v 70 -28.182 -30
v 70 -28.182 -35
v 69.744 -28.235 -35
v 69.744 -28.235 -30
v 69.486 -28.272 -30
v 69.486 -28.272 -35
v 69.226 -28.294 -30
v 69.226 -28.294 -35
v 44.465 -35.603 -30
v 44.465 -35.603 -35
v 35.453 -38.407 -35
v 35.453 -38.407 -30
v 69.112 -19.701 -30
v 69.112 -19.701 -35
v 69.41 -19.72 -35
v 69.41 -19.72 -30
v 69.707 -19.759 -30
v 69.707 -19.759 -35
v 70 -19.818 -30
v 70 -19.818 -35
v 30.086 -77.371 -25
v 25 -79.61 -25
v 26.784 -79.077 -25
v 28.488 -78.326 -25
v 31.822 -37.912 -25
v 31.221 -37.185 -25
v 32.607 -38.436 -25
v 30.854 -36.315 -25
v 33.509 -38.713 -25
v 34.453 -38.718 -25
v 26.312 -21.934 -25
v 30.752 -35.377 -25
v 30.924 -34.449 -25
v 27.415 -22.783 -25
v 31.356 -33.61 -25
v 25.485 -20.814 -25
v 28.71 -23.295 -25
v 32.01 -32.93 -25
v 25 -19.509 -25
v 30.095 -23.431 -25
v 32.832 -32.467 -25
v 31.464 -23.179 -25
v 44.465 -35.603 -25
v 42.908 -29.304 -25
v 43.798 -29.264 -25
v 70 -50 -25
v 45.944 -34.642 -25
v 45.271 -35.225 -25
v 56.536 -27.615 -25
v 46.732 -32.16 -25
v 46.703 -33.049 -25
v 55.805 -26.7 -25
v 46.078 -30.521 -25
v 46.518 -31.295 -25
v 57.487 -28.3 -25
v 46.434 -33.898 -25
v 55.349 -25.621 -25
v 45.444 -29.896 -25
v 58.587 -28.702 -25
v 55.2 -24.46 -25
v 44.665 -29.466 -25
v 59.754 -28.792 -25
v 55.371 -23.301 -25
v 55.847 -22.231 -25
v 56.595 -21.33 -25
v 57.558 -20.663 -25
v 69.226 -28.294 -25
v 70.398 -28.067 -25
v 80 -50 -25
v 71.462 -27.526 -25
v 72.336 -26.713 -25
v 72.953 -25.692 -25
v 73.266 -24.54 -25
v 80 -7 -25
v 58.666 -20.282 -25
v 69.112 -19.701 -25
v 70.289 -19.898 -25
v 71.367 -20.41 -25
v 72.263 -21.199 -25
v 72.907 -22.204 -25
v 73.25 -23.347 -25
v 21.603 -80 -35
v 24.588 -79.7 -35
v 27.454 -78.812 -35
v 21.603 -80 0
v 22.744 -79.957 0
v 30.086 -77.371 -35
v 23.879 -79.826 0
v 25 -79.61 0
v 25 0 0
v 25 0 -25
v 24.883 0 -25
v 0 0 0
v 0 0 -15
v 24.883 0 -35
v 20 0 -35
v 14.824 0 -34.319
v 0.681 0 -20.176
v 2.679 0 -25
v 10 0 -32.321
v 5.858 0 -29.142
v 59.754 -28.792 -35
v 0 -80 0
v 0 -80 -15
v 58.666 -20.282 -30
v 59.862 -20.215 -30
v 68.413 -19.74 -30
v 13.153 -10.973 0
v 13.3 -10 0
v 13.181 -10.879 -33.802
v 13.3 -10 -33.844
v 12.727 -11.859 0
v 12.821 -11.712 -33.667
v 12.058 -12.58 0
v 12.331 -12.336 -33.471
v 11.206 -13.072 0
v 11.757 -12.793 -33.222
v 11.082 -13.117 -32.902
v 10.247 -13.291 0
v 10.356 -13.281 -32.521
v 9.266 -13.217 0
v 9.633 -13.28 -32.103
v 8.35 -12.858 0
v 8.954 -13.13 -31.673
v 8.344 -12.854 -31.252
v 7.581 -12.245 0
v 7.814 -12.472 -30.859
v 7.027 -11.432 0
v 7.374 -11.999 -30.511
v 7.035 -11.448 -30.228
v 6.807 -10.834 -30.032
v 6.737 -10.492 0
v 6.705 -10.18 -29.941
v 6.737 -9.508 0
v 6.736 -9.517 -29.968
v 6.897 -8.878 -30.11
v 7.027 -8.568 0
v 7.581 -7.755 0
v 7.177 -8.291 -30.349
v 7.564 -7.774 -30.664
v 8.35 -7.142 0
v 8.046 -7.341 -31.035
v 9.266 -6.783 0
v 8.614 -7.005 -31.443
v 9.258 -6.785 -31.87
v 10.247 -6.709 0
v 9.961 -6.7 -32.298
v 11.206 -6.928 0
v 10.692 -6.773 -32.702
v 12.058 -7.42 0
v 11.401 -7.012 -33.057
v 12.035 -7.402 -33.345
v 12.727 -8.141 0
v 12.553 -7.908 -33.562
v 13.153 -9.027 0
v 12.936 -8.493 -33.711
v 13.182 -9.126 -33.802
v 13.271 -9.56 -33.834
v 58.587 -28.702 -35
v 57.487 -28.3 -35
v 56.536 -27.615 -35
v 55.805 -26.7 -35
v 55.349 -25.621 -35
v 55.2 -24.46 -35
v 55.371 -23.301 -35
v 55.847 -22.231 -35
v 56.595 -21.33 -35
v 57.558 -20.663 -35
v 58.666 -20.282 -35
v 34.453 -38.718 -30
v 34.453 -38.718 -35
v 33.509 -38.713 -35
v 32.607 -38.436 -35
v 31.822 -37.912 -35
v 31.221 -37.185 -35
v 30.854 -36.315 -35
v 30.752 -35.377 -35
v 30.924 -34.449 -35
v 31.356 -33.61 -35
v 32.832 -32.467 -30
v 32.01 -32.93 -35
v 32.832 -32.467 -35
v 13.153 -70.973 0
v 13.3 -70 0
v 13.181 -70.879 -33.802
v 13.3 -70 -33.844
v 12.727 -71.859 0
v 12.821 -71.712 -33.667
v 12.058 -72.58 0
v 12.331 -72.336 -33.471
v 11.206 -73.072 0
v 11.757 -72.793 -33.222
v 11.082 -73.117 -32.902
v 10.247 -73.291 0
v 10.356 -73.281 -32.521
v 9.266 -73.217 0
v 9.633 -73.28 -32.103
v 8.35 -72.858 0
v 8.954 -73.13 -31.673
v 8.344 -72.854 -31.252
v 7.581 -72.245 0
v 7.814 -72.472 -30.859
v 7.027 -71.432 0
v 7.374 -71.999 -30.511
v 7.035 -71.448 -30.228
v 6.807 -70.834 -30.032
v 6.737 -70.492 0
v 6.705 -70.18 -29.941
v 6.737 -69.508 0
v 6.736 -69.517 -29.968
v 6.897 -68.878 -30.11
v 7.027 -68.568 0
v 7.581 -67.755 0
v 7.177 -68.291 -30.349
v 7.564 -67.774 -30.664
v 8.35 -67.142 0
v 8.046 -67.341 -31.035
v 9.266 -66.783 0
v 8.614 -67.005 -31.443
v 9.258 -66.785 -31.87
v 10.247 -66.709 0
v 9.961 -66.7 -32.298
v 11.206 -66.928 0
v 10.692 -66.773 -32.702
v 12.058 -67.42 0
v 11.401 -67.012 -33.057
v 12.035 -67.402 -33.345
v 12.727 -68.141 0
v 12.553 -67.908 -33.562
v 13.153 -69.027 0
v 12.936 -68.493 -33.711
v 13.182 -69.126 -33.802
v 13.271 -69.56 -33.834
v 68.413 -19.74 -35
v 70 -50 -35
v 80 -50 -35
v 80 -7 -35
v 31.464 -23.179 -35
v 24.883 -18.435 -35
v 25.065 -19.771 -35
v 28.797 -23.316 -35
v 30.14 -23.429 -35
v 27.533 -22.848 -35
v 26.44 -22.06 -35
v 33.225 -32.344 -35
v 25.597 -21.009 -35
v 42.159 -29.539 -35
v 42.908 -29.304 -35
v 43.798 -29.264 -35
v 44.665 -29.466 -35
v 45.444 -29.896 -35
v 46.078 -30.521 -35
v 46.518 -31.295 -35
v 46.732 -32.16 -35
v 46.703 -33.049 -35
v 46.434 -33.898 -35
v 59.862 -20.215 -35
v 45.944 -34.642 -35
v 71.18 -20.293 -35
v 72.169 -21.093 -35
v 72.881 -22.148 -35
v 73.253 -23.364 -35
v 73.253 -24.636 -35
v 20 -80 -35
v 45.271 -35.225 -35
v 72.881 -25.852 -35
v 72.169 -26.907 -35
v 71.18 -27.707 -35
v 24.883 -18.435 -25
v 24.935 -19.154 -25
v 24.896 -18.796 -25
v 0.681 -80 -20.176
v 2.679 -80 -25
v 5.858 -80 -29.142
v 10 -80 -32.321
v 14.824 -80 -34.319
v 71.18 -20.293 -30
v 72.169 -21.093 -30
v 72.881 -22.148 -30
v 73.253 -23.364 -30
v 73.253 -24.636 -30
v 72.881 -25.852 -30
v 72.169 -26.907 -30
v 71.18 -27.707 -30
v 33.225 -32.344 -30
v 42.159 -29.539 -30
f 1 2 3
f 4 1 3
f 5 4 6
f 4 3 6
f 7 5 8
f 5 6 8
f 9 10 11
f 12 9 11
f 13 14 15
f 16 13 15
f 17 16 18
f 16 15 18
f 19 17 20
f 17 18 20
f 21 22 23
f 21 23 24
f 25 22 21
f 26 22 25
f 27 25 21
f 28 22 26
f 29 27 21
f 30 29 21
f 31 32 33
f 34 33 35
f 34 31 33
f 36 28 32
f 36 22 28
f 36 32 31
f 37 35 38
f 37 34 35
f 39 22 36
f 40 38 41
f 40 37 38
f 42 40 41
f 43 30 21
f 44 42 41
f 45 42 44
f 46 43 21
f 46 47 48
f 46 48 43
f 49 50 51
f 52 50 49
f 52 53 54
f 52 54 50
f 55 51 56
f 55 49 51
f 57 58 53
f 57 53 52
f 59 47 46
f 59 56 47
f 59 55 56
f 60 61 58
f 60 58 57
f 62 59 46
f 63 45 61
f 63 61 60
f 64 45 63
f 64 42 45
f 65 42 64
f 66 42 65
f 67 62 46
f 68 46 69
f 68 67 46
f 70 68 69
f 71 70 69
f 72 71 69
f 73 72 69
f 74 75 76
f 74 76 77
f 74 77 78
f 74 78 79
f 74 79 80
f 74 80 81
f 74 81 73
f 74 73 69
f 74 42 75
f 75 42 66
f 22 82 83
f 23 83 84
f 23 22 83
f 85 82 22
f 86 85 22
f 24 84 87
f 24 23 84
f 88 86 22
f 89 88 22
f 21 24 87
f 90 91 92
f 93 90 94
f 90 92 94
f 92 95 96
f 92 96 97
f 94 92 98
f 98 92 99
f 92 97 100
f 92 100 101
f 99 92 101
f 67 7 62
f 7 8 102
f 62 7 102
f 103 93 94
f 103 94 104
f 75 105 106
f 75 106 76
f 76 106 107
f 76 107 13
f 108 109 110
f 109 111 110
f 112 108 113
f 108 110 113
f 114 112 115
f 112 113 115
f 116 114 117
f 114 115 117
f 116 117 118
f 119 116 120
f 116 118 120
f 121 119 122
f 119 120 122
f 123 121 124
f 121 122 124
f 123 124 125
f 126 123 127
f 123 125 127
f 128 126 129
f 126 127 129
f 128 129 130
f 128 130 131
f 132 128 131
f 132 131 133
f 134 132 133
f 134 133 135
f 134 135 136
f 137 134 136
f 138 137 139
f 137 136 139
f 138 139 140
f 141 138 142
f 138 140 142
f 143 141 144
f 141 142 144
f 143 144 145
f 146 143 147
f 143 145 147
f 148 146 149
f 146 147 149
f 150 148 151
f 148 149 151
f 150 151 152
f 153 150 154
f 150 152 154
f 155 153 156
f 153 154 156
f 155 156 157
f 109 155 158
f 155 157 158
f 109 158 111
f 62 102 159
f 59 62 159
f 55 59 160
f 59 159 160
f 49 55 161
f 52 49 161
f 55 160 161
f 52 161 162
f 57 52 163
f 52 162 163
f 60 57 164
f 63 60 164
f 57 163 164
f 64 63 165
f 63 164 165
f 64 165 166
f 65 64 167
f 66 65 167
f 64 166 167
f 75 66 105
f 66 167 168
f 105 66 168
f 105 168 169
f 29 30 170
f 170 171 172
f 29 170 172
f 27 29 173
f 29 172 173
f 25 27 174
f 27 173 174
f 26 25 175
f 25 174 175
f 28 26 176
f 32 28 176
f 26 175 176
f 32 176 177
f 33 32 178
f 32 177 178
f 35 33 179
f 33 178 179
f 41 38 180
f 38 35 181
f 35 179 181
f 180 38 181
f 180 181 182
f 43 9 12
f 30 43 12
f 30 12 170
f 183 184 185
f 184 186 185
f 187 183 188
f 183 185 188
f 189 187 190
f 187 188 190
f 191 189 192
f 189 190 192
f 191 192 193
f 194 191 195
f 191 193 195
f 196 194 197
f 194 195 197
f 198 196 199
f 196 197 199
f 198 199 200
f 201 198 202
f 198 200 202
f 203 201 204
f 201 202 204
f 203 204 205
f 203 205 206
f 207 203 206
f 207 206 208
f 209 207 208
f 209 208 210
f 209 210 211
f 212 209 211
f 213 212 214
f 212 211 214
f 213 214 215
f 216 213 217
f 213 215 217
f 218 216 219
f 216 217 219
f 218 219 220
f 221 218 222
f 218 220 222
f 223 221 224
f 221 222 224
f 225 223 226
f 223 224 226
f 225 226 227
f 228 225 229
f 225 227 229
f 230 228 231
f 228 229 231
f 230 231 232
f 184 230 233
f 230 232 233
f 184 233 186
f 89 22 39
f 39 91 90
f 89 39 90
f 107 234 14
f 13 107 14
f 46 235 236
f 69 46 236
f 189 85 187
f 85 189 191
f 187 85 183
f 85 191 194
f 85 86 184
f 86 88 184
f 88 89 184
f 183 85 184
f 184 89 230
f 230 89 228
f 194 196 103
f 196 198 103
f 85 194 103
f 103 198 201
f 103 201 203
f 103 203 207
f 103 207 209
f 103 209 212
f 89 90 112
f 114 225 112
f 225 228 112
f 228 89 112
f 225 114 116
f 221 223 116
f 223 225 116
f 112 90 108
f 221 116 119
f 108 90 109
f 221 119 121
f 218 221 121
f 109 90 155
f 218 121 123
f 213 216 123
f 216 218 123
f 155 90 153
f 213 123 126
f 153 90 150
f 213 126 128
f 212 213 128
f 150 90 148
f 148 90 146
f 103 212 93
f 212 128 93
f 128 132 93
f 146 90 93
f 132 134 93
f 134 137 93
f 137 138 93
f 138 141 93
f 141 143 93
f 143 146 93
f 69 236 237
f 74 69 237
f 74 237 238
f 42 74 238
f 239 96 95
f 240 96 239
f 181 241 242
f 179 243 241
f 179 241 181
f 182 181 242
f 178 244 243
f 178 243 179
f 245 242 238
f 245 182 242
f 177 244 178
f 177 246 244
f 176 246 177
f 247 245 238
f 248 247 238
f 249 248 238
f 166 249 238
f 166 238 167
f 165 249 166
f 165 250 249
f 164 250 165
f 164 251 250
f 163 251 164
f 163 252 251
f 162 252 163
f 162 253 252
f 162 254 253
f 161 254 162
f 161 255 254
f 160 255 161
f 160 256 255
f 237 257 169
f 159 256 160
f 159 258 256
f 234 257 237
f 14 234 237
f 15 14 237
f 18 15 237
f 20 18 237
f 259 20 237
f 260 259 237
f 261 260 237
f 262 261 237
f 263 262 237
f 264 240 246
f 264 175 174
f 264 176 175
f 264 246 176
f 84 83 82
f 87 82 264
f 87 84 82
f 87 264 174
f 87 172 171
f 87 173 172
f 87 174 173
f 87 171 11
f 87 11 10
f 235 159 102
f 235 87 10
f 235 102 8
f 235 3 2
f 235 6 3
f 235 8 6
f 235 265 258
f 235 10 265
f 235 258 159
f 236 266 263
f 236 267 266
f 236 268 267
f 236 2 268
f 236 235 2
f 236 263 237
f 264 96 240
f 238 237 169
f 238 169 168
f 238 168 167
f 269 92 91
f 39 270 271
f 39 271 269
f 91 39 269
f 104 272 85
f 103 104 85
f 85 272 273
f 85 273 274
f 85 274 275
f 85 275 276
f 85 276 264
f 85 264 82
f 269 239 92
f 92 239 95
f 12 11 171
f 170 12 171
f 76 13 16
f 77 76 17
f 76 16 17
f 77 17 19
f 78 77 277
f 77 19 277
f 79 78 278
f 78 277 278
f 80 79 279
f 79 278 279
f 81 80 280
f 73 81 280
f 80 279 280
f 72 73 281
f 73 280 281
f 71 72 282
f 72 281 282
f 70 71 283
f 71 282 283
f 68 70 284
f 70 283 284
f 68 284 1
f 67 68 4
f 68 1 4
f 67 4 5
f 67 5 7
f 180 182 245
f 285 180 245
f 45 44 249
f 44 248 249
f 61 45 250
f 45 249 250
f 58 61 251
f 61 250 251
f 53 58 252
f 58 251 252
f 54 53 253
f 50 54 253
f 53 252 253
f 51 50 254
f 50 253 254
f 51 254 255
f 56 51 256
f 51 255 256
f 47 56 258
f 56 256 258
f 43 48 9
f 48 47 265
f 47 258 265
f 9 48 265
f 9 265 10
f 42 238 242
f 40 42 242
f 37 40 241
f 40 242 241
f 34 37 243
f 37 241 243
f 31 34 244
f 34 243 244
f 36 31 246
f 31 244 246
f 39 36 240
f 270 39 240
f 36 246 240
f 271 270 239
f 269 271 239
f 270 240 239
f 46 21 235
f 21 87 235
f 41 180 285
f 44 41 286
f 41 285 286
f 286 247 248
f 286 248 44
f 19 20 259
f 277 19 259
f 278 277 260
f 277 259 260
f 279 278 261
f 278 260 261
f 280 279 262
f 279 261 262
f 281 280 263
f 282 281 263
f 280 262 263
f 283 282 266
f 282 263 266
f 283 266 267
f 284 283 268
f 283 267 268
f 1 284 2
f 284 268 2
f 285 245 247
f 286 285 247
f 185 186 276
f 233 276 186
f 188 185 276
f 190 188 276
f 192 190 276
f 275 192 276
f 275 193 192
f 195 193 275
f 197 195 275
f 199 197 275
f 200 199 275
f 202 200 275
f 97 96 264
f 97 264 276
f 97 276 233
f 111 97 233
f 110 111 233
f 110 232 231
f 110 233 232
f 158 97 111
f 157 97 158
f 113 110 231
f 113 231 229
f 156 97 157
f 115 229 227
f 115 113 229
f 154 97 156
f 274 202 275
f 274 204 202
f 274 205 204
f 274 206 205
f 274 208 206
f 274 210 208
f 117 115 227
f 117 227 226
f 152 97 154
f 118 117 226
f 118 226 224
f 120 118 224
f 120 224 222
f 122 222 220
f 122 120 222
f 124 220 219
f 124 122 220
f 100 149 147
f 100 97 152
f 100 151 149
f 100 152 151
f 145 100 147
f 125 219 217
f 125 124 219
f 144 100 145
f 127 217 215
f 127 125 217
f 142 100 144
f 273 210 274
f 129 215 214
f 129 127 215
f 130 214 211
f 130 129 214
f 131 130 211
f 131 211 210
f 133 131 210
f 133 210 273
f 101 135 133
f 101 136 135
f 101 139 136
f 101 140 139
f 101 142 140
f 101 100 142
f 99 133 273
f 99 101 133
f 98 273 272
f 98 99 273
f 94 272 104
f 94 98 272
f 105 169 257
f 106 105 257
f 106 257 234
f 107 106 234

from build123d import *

# Parameters (mm, degrees)
F1_DEPTH     = 80
F2_R         = 3.3
F3_DEPTH     = 25
F5_DEPTH     = 25
F7_W         = 50
F7_H         = 5
F8_DEPTH     = 10
F9_DEPTH     = 25
F11_W        = 20
F11_H        = 80
F11_R        = 3.3
F12_DEPTH    = 30
F13_T1_DEPTH = 180
F15_DEPTH    = 5
F16_DEPTH    = 10
F17_R        = 15


# Not quite as in the source:
# - a fillet or chamfer that OpenCascade refuses, or shapes differently, is made with other operations: its cross-section is extruded or revolved along the edge and cut away or added


with BuildPart() as f1:
    # F0 (on Front) → F1 (new body)
    with BuildSketch(Plane.XZ):
        Polygon((25, 0), (0, 0), (0, -5), (20, -5), (20, -35), (70, -35), (70, -30), (25, -30), align=None)
    extrude(amount=F1_DEPTH)

    # F2 (on face) → F3 (cut)
    with BuildSketch(Plane(origin=(0, 0, -5), x_dir=(1, 0, 0), z_dir=(0, 0, -1))):
        with Locations((10, 70)):
            Circle(F2_R)
        with Locations((10, 10)):
            Circle(F2_R)
    extrude(amount=-F3_DEPTH, mode=Mode.SUBTRACT)

    # F4 (on face) → F5 (cut)
    with BuildSketch(Plane(origin=(0, 0, -35), x_dir=(1, 0, 0), z_dir=(0, 0, -1))):
        Polygon((26.251764968, 80), (70, 50), (70, 80), align=None)
    extrude(amount=-F5_DEPTH, mode=Mode.SUBTRACT)

    # F7 (on face) → F8 (join)
    with BuildSketch(Plane.YZ.offset(70)):
        with Locations((-25, -32.5)):
            Rectangle(F7_W, F7_H)
    extrude(amount=F8_DEPTH)

    # F6 (on face) → F9 (cut)
    with BuildSketch(Plane(origin=(0, 0, -35), x_dir=(1, 0, 0), z_dir=(0, 0, -1))):
        with BuildLine():
            Line((33.2249982655, 32.343756614), (42.1594857766, 29.5393376388))
            Line((42.1594857766, 29.5393376388), (42.9081277459, 29.3043486994))
            ThreePointArc((42.9081277459, 29.3043486994), (46.655005577, 31.7199744818), (44.4654424177, 35.6032919518))
            Line((44.4654424177, 35.6032919518), (35.4531247971, 38.407048043))
            Line((35.4531247971, 38.407048043), (34.4525012517, 38.7183447014))
            ThreePointArc((34.4525012517, 38.7183447014), (30.8539491948, 36.3153921333), (32.8322864897, 32.4670237129))
            Line((32.8322864897, 32.4670237129), (33.2249982655, 32.343756614))
        make_face()
        with BuildLine():
            Line((59.8621358425, 20.2152762479), (68.4127130059, 19.7402941432))
            Line((68.4127130059, 19.7402941432), (69.1118786564, 19.7014556922))
            ThreePointArc((69.1118786564, 19.7014556922), (69.558979499, 19.7364871386), (70, 19.8178952667))
            Line((70, 19.8178952667), (70, 28.1821047333))
            ThreePointArc((70, 28.1821047333), (69.6155307917, 28.2557163727), (69.2259603929, 28.2940589075))
            Line((69.2259603929, 28.2940589075), (59.7544017562, 28.7924677921))
            ThreePointArc((59.7544017562, 28.7924677921), (55.2347672319, 25.0457008651), (58.6655262733, 20.2817475657))
            Line((58.6655262733, 20.2817475657), (59.8621358425, 20.2152762479))
        make_face()
        with BuildLine():
            Line((70, 28.1821047333), (70, 19.8178952667))
            ThreePointArc((70, 19.8178952667), (73.3, 24), (70, 28.1821047333))
        make_face()
    extrude(amount=-F9_DEPTH, mode=Mode.SUBTRACT)

    # F11 (on face) → F12 (join)
    with BuildSketch(Plane(origin=(0, 0, -5), x_dir=(1, 0, 0), z_dir=(0, 0, -1))):
        with Locations((10, 40)):
            Rectangle(F11_W, F11_H)
        with Locations((10, 10)):
            Circle(F11_R, mode=Mode.SUBTRACT)
        with Locations((10, 70)):
            Circle(F11_R, mode=Mode.SUBTRACT)
    extrude(amount=F12_DEPTH)

    # F13: fillet of radius 20 on 1 edges, made by hand

    # F13_s2 → F13_t1 (cut)
    with BuildSketch(Plane.XZ.offset(-50)):
        with BuildLine():
            ThreePointArc((20, -35), (5.8578643763, -29.1421356237), (0, -15))
            Line((0, -15), (0, -35))
            Line((0, -35), (20, -35))
        make_face()
    extrude(amount=F13_T1_DEPTH, mode=Mode.SUBTRACT)

    # F14 (on face) → F15 (join)
    with BuildSketch(Plane.XY.offset(-30)):
        Polygon((80, 0), (25, 0), (25, -80), (26.251764968, -80), (70, -50), (80, -50), (80, -47.8473119438), align=None)
        with BuildLine():
            ThreePointArc((42.9081277459, -29.3043486994), (46.655005577, -31.7199744818), (44.4654424177, -35.6032919518))
            Line((44.4654424177, -35.6032919518), (34.4525012517, -38.7183447014))
            ThreePointArc((34.4525012517, -38.7183447014), (30.8539491948, -36.3153921333), (32.8322864897, -32.4670237129))
            Line((32.8322864897, -32.4670237129), (42.9081277459, -29.3043486994))
        make_face(mode=Mode.SUBTRACT)
        with BuildLine():
            ThreePointArc((69.1118786564, -19.7014556922), (73.2996210658, -23.9429150602), (69.2259603929, -28.2940589075))
            Line((69.2259603929, -28.2940589075), (59.7544017562, -28.7924677921))
            ThreePointArc((59.7544017562, -28.7924677921), (55.2347672319, -25.0457008651), (58.6655262733, -20.2817475657))
            Line((58.6655262733, -20.2817475657), (69.1118786564, -19.7014556922))
        make_face(mode=Mode.SUBTRACT)
    extrude(amount=F15_DEPTH)

    # F10 (on face) → F16 (cut)
    with BuildSketch(Plane(origin=(0, 0, -35), x_dir=(1, 0, 0), z_dir=(0, 0, -1))):
        with BuildLine():
            Line((80, 7), (31.4644035058, 23.1785321647))
            ThreePointArc((31.4644035058, 23.1785321647), (26.9597132524, 22.4913266004), (24.8832646757, 18.4351156745))
            Line((24.8832646757, 18.4351156745), (24.8832646757, 0))
            Line((24.8832646757, 0), (80, 0))
            Line((80, 0), (80, 7))
        make_face()
    extrude(amount=-F16_DEPTH, mode=Mode.SUBTRACT)

    # F17
    f17_edges = [f1.edges().sort_by_distance(p)[0] for p in [
        (26.251765, -80, -30),
    ]]
    fillet(f17_edges, radius=F17_R)


solid = f1.part
